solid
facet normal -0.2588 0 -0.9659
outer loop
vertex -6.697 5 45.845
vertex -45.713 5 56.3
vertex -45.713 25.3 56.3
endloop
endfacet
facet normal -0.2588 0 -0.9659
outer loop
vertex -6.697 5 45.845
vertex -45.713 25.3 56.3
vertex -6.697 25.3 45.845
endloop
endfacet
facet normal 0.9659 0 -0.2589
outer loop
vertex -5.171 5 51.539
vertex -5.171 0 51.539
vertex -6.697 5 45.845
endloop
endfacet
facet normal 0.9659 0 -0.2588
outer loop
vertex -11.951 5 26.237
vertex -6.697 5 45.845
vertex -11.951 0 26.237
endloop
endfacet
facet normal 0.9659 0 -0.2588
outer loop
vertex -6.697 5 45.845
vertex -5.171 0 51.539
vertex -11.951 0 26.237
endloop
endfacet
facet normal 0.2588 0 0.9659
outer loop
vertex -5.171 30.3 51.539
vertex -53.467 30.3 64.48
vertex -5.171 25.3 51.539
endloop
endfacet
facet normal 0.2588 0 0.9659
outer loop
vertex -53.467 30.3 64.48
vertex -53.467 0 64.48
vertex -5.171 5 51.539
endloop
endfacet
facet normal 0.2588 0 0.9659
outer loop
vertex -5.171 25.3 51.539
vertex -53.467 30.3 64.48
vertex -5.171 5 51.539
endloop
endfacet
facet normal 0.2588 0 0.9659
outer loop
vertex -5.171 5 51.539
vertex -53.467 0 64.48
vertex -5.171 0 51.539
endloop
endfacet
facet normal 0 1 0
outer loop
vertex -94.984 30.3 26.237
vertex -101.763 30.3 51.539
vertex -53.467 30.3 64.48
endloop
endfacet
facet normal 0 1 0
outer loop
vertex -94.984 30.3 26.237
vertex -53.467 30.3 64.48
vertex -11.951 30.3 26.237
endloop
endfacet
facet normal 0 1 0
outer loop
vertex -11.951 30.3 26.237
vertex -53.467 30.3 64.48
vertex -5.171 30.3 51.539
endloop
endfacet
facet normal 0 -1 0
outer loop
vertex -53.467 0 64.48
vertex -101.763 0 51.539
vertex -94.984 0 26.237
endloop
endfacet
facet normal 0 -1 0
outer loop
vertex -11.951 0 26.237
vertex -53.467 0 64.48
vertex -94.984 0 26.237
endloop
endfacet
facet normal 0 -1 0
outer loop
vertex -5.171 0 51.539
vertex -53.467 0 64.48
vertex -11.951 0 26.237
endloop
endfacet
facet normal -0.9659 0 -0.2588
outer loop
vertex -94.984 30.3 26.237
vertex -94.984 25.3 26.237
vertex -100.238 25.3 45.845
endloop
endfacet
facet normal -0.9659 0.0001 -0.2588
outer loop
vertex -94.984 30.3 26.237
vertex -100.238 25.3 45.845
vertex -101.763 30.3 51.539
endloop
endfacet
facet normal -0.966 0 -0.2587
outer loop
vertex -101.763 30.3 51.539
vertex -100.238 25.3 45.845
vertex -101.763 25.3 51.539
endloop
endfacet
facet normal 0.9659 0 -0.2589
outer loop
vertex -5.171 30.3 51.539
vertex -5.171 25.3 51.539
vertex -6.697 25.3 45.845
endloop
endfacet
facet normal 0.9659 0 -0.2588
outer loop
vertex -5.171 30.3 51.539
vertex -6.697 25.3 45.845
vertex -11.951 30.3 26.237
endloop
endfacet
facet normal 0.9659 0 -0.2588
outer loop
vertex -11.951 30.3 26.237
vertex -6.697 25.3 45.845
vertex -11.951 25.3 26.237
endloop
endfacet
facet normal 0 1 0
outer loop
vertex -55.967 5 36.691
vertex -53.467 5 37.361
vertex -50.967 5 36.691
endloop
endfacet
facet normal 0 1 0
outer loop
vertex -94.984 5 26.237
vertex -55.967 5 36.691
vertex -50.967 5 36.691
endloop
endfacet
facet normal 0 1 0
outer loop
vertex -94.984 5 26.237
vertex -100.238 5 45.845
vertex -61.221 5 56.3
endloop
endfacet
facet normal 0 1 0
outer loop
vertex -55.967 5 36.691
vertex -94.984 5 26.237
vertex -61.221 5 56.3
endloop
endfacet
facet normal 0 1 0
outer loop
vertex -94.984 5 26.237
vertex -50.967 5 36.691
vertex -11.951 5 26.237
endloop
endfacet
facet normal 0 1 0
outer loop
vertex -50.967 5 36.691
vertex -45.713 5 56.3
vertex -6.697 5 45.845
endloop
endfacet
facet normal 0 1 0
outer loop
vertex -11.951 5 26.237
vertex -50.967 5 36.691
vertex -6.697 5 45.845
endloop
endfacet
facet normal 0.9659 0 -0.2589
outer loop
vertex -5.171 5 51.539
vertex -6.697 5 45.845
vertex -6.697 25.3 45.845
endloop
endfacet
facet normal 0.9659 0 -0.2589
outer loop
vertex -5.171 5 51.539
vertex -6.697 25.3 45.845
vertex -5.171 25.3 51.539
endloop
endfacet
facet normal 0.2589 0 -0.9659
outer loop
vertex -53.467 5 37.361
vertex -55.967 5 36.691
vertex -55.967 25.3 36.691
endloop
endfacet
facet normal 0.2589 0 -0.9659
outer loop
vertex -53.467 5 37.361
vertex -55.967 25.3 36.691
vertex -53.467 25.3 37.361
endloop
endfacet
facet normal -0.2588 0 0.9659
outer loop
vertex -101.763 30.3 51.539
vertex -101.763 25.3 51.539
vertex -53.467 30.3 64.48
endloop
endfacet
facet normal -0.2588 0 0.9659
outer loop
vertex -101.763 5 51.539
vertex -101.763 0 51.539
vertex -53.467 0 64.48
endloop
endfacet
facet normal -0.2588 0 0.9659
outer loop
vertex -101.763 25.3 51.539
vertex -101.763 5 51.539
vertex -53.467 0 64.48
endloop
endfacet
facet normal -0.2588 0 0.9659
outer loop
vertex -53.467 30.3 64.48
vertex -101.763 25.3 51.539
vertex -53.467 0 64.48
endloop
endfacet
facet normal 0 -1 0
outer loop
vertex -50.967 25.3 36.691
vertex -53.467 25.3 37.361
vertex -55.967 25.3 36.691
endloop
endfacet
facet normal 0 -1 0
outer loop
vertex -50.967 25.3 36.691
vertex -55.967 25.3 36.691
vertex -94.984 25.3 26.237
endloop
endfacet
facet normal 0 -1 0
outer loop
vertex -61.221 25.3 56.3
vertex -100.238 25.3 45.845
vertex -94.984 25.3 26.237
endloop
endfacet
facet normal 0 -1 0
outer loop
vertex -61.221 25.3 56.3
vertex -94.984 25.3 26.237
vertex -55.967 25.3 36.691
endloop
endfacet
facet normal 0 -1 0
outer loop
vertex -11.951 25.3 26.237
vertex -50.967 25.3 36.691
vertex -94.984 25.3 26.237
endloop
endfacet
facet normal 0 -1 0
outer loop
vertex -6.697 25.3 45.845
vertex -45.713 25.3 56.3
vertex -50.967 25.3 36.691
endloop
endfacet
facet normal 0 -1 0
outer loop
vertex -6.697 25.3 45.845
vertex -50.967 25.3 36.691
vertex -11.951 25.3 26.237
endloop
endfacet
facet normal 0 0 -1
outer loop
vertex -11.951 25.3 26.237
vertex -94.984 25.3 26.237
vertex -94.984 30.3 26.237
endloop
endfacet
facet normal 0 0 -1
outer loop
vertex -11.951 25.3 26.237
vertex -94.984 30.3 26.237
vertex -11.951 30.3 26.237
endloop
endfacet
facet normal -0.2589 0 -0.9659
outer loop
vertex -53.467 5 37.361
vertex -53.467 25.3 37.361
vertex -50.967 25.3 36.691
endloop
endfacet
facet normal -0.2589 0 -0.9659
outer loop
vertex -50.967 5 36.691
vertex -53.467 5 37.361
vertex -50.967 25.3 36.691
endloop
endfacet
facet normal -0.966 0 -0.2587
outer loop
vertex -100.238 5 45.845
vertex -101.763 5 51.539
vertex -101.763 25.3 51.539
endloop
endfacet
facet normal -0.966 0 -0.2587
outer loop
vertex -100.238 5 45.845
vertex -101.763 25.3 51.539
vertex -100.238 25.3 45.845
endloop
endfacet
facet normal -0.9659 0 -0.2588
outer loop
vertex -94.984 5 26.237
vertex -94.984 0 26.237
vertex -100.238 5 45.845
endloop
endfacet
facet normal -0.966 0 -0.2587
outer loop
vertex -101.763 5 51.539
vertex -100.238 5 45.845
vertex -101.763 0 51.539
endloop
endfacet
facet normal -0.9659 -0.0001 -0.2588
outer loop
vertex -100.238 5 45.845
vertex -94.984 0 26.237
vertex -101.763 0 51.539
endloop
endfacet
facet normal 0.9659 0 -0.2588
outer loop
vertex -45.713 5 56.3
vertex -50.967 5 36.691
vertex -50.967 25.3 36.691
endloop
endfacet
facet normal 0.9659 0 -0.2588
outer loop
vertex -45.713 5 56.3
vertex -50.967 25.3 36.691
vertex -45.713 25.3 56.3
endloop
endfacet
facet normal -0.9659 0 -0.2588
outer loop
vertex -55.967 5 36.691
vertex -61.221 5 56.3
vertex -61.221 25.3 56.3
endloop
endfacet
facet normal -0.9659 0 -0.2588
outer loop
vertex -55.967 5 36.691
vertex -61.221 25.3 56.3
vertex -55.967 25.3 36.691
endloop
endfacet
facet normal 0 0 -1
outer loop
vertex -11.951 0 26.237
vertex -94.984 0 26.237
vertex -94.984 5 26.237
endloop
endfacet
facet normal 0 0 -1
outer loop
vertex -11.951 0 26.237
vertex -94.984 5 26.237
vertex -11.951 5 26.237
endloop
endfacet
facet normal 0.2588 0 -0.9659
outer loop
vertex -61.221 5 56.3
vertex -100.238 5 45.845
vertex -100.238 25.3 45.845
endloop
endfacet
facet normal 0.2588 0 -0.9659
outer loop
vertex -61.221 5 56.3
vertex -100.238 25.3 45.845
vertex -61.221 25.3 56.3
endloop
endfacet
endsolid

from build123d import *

# Parameters (mm, degrees)
BOSS_EXTRUDE3_DEPTH  = 5
BOSS_EXTRUDE4_DEPTH  = 20.3
BOSS_EXTRUDE5_DEPTH  = 5
BOSS_EXTRUDE16_DEPTH = 5
BOSS_EXTRUDE17_DEPTH = 5


with BuildPart() as part:
    # Sketch4 → Boss-Extrude3 (new body)
    with BuildSketch(Plane(origin=(0, 0, 0), x_dir=(1, 0, 0), z_dir=(0, 1, 0))):
        Polygon((-53.467203663, -64.48008602), (-5.170912349, -51.539133765), (-11.950631556, -26.23687722), (-53.467203663, -37.361209189), (-94.98377577, -26.23687722), (-101.763494978, -51.539133765), align=None)
    extrude(amount=BOSS_EXTRUDE3_DEPTH)

    # Sketch5 → Boss-Extrude4 (add)
    with BuildSketch(Plane(origin=(0, 5, 0), x_dir=(1, 0, 0), z_dir=(0, 1, 0))):
        Polygon((-45.713177048, -56.299630481), (-6.696604941, -45.845171494), (-5.170912349, -51.539133765), (-53.467203663, -64.48008602), (-101.763494978, -51.539133765), (-100.237802385, -45.845171494), (-61.221230279, -56.299630481), (-55.967203663, -36.691336208), (-53.467203663, -37.361209189), (-50.967203663, -36.691336208), align=None)
    extrude(amount=BOSS_EXTRUDE4_DEPTH)

    # Sketch6 → Boss-Extrude5 (add)
    with BuildSketch(Plane(origin=(0, 25.3, 0), x_dir=(1, 0, 0), z_dir=(0, 1, 0))):
        Polygon((-5.170912349, -51.539133765), (-11.950631556, -26.23687722), (-53.467203663, -37.361209189), (-94.98377577, -26.23687722), (-101.763494978, -51.539133765), (-53.467203663, -64.48008602), align=None)
    extrude(amount=BOSS_EXTRUDE5_DEPTH)

    # Sketch20 → Boss-Extrude16 (add)
    with BuildSketch(Plane.XZ.offset(-25.3)):
        Polygon((-94.98377577, 26.23687722), (-11.950631556, 26.23687722), (-53.467203663, 37.361209189), align=None)
    extrude(amount=-BOSS_EXTRUDE16_DEPTH)

    # Sketch21 → Boss-Extrude17 (add)
    with BuildSketch(Plane.XZ):
        Polygon((-11.950631556, 26.23687722), (-53.467203663, 37.361209189), (-94.98377577, 26.23687722), align=None)
    extrude(amount=-BOSS_EXTRUDE17_DEPTH)


solid = part.part
